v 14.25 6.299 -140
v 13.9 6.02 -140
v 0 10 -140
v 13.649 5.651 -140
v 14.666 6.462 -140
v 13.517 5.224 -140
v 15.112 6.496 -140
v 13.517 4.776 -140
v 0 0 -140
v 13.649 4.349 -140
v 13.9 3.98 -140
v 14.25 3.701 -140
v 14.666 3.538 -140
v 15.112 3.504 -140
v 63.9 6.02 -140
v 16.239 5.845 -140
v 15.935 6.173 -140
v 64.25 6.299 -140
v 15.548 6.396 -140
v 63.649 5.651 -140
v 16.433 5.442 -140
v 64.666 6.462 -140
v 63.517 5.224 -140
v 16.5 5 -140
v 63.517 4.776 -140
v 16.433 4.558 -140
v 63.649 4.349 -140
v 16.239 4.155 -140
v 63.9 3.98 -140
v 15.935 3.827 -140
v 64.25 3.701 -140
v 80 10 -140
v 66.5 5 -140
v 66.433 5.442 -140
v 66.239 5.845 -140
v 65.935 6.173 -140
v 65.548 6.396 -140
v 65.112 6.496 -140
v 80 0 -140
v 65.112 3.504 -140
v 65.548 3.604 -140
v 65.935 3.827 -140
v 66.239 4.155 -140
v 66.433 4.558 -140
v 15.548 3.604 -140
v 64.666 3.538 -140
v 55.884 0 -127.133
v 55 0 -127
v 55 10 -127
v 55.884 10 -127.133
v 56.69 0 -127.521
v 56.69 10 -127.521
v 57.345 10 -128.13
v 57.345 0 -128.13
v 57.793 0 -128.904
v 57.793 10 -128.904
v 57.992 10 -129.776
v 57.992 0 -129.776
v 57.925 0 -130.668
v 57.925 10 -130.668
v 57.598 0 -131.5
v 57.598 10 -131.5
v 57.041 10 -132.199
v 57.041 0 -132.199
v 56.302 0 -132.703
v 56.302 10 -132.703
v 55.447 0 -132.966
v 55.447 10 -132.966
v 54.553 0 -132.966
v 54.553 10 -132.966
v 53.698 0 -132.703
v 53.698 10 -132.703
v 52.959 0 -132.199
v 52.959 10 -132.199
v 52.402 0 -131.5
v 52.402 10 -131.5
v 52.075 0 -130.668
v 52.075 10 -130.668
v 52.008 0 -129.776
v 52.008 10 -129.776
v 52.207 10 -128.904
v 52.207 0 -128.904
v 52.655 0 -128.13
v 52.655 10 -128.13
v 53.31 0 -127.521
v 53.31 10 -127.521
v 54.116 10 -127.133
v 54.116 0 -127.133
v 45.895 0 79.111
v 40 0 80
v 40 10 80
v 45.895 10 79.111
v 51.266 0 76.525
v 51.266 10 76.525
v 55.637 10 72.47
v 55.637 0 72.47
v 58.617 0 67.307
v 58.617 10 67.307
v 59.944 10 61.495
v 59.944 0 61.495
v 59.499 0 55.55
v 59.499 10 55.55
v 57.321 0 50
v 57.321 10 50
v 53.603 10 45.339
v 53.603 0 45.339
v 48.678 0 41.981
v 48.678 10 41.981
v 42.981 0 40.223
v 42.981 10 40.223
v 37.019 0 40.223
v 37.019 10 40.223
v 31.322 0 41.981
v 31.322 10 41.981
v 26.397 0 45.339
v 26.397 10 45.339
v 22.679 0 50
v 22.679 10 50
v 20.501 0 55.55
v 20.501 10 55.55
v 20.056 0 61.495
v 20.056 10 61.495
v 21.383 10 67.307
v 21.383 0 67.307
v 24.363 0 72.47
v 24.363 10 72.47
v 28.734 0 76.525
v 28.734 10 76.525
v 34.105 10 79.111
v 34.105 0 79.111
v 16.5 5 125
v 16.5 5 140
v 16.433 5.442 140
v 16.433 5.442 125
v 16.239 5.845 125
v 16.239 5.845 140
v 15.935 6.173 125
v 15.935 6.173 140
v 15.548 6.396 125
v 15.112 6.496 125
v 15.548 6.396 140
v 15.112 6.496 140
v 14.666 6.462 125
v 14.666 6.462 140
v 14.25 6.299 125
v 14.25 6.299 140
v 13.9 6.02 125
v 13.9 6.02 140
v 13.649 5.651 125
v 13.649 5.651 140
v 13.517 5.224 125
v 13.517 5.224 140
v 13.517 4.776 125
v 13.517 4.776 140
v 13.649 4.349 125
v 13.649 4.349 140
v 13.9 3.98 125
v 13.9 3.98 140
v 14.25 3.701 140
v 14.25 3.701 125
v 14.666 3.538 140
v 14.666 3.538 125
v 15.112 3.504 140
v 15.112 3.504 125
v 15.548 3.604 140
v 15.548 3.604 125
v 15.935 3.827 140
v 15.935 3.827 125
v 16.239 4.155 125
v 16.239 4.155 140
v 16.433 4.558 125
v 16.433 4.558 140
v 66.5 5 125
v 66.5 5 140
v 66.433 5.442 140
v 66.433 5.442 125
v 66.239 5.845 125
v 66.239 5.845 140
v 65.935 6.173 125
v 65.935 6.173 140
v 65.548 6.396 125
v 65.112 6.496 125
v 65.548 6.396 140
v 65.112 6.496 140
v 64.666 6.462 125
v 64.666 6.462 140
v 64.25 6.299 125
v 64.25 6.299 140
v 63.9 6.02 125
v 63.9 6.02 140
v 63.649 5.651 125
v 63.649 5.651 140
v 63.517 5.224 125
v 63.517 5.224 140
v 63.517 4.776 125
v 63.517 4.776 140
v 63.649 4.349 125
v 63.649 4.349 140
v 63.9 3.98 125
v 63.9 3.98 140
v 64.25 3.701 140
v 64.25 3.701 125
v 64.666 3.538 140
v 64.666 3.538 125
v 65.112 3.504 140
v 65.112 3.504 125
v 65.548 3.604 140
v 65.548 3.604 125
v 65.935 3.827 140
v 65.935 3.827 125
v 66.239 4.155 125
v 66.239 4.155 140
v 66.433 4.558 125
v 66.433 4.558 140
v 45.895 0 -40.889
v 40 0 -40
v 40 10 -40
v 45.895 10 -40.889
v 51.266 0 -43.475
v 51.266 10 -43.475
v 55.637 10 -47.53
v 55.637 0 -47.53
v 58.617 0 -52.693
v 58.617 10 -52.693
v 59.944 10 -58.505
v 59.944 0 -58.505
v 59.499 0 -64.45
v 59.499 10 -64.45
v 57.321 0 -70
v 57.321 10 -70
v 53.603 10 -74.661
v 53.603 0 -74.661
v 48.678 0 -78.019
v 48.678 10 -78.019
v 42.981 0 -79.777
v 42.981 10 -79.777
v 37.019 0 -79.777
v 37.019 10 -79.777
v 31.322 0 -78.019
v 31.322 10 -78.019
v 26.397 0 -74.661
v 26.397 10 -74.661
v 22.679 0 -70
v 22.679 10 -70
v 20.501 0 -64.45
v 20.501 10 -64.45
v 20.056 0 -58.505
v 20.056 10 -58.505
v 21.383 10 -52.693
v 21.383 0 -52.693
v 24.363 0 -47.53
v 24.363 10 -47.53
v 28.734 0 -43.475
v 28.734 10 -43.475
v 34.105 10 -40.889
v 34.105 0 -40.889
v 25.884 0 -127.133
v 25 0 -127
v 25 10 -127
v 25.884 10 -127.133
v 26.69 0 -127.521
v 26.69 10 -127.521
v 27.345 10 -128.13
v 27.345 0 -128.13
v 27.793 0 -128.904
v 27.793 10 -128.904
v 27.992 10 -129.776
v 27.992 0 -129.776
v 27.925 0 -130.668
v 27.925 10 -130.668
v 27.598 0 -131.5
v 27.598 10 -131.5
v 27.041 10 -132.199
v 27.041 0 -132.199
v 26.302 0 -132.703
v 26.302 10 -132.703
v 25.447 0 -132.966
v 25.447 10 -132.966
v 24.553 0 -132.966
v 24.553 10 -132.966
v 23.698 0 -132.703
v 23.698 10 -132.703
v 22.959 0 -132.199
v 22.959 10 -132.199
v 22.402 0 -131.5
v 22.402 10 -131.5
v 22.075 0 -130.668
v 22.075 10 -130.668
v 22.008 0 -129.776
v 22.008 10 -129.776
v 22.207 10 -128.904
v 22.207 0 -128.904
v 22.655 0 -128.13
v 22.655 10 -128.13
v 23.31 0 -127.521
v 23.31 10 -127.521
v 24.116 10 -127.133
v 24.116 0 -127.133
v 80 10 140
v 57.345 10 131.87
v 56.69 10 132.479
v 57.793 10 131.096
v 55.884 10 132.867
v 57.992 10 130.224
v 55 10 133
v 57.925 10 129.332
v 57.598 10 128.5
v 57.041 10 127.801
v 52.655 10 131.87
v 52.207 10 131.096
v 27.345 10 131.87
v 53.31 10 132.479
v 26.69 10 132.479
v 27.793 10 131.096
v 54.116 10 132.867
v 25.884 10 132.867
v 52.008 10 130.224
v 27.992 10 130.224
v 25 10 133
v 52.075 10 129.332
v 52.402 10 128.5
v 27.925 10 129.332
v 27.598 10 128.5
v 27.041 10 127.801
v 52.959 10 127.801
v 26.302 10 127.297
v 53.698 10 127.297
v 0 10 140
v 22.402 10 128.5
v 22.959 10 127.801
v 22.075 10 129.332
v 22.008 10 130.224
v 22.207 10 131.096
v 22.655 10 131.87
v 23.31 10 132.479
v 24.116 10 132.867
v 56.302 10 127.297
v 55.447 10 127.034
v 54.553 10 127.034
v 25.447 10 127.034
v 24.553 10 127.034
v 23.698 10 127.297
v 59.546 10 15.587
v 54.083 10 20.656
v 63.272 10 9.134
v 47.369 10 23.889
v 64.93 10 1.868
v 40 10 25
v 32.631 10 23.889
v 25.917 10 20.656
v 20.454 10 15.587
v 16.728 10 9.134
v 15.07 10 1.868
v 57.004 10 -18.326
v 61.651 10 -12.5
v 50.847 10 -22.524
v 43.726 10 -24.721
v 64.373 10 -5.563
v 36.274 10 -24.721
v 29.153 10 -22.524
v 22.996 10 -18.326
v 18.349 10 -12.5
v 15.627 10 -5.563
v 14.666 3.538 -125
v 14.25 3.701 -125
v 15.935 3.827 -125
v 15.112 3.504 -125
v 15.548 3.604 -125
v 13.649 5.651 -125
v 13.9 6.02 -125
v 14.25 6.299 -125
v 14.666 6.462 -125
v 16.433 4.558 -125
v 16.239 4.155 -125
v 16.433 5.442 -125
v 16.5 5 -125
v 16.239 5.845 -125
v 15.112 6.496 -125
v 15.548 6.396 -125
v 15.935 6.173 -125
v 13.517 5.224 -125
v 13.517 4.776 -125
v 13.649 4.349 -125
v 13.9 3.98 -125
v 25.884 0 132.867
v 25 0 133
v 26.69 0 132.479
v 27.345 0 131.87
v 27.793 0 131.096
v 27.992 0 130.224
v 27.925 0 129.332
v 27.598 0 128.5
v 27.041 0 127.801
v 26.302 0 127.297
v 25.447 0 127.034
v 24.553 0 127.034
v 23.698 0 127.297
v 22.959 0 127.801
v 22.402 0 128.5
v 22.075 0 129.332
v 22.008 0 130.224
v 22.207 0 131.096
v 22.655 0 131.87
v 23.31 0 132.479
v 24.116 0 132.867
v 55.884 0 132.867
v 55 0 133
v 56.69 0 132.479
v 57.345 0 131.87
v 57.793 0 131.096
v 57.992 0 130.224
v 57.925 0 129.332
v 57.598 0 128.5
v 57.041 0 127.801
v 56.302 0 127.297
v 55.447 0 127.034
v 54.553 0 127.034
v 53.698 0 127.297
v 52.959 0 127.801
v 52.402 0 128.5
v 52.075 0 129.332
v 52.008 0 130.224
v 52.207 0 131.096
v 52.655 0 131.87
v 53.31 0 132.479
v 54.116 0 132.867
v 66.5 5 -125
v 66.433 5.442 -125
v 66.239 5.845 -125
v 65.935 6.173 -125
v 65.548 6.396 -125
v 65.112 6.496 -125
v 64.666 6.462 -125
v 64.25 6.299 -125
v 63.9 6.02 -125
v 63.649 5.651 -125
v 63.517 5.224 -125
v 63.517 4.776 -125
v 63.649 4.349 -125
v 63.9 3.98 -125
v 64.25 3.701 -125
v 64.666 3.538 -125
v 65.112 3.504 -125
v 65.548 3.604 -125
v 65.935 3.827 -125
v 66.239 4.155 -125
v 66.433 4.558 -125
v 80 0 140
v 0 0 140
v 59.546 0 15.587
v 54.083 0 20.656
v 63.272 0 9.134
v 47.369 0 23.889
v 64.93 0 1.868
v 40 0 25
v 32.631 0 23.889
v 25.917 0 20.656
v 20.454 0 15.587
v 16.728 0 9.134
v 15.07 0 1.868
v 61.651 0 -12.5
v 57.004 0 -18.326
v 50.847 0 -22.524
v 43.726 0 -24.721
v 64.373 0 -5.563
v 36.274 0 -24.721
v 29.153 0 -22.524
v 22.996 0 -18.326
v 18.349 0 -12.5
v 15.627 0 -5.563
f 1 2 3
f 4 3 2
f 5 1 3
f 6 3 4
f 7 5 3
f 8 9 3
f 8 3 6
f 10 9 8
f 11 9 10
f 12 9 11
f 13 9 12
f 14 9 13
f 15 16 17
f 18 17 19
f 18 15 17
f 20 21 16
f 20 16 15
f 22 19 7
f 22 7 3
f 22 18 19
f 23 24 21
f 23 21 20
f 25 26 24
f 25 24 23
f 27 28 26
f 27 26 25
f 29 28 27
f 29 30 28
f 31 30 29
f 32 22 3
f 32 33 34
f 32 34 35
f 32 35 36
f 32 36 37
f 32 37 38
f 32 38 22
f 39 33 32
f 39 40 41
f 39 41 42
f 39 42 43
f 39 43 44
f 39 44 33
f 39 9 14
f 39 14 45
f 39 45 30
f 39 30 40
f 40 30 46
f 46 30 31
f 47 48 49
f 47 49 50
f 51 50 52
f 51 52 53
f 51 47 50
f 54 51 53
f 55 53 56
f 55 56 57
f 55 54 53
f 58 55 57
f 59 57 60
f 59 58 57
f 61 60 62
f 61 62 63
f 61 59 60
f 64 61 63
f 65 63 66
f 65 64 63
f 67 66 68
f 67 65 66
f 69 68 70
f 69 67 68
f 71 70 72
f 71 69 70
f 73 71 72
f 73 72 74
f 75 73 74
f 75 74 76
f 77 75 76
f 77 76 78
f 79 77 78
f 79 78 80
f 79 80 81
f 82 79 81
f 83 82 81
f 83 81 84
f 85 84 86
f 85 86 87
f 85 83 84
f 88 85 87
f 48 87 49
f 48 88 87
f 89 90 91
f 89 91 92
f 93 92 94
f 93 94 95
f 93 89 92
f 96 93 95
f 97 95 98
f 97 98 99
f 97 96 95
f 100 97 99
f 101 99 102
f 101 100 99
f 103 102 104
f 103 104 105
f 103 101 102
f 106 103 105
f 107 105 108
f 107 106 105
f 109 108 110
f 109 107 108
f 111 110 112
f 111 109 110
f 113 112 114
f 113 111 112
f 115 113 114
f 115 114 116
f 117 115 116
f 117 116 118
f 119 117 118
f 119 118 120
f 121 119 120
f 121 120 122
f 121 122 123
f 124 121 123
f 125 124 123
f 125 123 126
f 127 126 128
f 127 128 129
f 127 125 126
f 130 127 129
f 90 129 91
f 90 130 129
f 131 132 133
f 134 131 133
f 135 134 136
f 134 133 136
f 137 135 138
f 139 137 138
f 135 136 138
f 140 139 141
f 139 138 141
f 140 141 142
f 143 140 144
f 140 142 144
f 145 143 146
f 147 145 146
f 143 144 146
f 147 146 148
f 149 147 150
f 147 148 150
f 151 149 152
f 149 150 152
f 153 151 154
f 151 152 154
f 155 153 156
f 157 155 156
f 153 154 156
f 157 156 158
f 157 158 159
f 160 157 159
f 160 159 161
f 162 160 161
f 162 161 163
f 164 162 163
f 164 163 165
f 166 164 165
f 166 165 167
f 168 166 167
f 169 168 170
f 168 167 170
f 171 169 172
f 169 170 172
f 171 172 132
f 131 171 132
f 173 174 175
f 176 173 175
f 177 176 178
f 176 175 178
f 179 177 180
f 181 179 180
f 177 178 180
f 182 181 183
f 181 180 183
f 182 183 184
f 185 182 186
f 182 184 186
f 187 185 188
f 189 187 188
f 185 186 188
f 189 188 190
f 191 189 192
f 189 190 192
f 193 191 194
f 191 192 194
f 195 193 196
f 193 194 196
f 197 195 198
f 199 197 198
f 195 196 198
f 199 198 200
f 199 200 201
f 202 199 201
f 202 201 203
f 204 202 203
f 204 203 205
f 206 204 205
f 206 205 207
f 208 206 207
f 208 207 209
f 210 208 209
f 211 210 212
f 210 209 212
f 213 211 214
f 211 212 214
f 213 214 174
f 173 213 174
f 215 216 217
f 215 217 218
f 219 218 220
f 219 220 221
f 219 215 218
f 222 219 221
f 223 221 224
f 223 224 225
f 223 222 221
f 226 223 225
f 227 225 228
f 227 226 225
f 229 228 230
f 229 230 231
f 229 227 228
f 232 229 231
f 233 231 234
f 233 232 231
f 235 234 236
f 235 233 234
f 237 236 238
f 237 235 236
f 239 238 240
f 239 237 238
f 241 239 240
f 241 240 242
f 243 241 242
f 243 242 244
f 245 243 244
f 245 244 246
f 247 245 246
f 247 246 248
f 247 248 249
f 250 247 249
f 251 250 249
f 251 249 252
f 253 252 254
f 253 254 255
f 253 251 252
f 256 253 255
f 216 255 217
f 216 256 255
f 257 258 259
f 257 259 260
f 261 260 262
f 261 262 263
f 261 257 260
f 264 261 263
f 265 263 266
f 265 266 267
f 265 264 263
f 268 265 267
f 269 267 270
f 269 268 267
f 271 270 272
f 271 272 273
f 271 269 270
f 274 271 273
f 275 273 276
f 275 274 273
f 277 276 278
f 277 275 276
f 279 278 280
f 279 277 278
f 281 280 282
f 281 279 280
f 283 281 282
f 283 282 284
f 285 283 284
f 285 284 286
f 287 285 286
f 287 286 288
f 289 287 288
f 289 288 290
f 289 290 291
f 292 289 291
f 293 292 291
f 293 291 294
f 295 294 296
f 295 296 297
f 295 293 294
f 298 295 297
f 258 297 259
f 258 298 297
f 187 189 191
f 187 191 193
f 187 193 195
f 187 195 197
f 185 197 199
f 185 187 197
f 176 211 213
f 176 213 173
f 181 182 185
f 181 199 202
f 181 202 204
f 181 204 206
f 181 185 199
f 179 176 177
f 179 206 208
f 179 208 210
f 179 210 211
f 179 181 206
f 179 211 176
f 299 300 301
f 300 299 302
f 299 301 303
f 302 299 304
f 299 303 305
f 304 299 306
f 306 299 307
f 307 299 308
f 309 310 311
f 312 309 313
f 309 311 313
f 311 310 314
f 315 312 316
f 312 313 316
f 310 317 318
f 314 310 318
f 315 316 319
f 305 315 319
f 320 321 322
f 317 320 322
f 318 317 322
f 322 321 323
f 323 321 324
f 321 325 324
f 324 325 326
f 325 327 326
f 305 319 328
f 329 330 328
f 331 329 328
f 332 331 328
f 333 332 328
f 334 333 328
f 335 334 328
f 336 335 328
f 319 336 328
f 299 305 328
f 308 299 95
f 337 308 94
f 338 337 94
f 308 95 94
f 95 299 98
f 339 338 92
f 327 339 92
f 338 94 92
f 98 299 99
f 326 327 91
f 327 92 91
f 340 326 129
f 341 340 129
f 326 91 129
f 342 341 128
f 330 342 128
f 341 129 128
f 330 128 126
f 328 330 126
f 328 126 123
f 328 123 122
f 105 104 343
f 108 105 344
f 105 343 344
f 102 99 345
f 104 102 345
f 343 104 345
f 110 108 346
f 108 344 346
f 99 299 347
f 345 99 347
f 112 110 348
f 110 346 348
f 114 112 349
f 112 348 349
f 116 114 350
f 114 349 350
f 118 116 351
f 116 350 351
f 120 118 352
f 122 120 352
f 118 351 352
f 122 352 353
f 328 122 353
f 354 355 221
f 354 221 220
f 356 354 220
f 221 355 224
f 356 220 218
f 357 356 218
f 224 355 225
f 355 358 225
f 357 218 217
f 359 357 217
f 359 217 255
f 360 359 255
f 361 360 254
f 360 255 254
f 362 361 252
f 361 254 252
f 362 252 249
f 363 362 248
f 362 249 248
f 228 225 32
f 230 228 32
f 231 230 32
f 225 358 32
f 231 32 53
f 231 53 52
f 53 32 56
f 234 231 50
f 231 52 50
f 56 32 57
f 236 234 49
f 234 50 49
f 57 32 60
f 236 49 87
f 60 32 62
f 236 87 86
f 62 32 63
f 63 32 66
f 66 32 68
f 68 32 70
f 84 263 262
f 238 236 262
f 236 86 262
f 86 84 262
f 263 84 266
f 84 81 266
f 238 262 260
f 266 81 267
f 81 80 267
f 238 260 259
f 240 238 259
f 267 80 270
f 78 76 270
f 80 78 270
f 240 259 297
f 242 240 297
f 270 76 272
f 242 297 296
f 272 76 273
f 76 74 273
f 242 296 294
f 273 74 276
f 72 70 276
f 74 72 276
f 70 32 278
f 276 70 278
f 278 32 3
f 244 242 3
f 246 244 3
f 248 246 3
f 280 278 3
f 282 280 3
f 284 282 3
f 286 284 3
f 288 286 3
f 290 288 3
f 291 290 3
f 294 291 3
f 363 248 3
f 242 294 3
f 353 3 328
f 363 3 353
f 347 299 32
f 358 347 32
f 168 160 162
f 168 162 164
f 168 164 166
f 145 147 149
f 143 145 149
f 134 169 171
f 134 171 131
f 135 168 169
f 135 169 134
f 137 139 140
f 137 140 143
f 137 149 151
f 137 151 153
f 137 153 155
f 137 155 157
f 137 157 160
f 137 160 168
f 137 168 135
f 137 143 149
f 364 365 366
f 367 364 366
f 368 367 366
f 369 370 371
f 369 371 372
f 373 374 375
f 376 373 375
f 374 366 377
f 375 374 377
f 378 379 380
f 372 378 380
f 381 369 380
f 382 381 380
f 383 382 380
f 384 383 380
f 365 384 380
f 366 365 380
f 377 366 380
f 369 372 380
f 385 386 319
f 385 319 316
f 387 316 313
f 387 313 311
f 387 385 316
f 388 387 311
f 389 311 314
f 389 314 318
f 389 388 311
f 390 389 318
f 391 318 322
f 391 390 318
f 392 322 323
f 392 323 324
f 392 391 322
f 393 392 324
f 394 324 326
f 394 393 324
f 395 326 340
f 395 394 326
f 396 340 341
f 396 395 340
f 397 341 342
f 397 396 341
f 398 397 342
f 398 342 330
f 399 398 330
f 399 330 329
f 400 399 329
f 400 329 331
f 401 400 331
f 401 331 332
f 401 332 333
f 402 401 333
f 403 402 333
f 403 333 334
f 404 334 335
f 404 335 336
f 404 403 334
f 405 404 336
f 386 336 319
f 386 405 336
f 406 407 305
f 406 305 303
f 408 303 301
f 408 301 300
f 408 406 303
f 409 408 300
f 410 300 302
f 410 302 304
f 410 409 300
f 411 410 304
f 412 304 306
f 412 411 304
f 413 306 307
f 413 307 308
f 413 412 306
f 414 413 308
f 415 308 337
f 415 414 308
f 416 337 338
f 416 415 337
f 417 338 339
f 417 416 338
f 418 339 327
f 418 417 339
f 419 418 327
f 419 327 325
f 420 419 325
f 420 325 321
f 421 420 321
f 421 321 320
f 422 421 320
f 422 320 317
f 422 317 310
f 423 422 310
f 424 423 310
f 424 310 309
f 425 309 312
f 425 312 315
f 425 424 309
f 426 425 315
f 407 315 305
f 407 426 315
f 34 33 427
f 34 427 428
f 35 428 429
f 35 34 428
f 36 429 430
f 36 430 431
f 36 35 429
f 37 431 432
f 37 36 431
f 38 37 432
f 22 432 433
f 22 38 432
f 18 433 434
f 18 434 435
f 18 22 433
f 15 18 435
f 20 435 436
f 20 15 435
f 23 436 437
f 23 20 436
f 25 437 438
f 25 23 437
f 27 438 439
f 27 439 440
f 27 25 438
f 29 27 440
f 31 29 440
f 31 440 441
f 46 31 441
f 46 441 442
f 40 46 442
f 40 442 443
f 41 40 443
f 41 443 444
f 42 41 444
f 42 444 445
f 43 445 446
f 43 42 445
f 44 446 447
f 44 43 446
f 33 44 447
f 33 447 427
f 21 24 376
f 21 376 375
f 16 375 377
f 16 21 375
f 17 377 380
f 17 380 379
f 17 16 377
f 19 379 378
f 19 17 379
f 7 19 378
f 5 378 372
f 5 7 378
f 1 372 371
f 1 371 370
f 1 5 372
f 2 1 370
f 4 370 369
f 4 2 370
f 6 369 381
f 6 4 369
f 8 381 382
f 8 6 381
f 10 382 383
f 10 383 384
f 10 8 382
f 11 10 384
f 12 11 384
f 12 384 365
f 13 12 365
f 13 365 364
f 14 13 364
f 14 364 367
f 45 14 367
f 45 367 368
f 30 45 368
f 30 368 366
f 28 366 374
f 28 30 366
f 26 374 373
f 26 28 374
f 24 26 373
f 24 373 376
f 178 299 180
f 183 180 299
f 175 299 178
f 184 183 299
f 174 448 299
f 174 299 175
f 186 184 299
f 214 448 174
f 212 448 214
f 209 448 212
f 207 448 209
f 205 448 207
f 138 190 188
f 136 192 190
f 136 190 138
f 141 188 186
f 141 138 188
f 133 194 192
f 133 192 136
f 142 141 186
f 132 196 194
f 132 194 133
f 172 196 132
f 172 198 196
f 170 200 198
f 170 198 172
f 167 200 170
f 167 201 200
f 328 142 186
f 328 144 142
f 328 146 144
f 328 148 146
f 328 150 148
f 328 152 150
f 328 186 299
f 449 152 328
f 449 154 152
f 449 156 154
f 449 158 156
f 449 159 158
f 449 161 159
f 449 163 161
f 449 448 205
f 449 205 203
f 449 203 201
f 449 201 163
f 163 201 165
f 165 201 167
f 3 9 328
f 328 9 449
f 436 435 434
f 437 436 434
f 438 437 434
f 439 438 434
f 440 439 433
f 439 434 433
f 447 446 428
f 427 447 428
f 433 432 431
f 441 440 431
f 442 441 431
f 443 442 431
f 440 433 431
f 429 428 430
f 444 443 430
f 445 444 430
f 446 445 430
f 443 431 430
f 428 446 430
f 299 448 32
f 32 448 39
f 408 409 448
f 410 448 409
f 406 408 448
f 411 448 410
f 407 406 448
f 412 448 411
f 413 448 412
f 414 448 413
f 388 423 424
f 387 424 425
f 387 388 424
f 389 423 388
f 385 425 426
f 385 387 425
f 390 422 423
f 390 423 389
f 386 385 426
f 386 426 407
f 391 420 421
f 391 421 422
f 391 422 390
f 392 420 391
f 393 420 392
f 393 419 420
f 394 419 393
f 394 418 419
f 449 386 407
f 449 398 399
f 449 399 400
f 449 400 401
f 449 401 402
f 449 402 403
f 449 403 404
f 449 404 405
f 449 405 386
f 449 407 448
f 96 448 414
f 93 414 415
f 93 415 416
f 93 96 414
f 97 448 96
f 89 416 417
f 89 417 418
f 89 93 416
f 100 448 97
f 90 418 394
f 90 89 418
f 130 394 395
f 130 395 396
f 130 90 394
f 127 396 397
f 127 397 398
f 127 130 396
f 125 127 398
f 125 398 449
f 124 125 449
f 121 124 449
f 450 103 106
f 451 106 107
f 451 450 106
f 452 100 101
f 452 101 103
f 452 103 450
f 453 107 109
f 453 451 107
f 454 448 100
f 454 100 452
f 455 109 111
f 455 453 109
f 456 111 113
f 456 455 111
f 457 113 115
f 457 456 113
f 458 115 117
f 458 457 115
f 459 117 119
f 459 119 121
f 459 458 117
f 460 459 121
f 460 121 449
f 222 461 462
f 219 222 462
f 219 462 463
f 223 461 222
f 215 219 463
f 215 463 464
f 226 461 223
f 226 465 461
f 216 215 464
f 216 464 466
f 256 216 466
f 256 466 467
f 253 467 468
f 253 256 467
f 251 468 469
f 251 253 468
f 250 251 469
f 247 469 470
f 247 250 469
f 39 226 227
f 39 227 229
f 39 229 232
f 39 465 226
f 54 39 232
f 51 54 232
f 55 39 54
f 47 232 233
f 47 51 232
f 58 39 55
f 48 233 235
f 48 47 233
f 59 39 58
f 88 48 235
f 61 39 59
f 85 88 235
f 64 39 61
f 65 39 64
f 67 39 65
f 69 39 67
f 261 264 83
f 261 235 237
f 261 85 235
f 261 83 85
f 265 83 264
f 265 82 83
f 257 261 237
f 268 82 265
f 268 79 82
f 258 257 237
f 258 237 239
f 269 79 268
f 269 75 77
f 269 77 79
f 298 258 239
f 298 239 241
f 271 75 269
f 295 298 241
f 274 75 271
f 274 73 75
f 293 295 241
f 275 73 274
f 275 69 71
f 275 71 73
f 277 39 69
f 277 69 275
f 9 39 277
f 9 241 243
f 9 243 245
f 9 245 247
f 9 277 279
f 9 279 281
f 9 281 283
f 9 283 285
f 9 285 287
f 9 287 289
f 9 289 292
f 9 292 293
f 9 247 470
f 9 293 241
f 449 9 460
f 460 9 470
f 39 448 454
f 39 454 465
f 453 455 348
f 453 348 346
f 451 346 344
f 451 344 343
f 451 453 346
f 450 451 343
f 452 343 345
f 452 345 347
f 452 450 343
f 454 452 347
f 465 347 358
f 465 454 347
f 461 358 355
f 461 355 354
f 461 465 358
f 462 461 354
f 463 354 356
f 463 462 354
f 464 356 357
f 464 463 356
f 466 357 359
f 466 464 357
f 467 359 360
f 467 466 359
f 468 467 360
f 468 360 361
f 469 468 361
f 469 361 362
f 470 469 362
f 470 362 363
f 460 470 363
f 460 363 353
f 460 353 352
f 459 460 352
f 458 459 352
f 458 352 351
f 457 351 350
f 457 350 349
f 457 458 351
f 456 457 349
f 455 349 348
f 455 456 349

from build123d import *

# Parameters (mm, degrees)
SKETCH1_R           = 3
SKETCH1_R_2         = 25
SKETCH1_R_3         = 20
BOSS_EXTRUDE1_DEPTH = 10
SKETCH2_R           = 1.5
CUT_EXTRUDE1_DEPTH  = 15


with BuildPart() as part:
    # Sketch1 → Boss-Extrude1 (new body)
    with BuildSketch(Plane(origin=(0, 0, 0), x_dir=(1, 0, 0), z_dir=(0, 1, 0))):
        Polygon((0, -110), (0, 110), (0, 140), (80, 140), (80, 110), (80, -110), (80, -140), (0, -140), align=None)
        with Locations(Location((25, 130, 0), (0, 0, 270))):
            Circle(SKETCH1_R, mode=Mode.SUBTRACT)
        with Locations(Location((55, 130, 0), (0, 0, 270))):
            Circle(SKETCH1_R, mode=Mode.SUBTRACT)
        with Locations(Location((25, -130, 0), (0, 0, 270))):
            Circle(SKETCH1_R, mode=Mode.SUBTRACT)
        with Locations(Location((55, -130, 0), (0, 0, 270))):
            Circle(SKETCH1_R, mode=Mode.SUBTRACT)
        with Locations(Location((40, 0, 0), (0, 0, 270))):
            Circle(SKETCH1_R_2, mode=Mode.SUBTRACT)
        with Locations(Location((40, -60, 0), (0, 0, 270))):
            Circle(SKETCH1_R_3, mode=Mode.SUBTRACT)
        with Locations(Location((40, 60, 0), (0, 0, 270))):
            Circle(SKETCH1_R_3, mode=Mode.SUBTRACT)
    extrude(amount=BOSS_EXTRUDE1_DEPTH)

    # Sketch2 → Cut-Extrude1 (cut)
    with BuildSketch(Plane.XY.offset(140)):
        with Locations((15, 5)):
            Circle(SKETCH2_R)
        with Locations((65, 5)):
            Circle(SKETCH2_R)
    cut_extrude1 = extrude(amount=-CUT_EXTRUDE1_DEPTH, mode=Mode.SUBTRACT)

    # Mirror1: Cut-Extrude1 across plane
    add(cut_extrude1.mirror(Plane.XY), mode=Mode.SUBTRACT)


solid = part.part
